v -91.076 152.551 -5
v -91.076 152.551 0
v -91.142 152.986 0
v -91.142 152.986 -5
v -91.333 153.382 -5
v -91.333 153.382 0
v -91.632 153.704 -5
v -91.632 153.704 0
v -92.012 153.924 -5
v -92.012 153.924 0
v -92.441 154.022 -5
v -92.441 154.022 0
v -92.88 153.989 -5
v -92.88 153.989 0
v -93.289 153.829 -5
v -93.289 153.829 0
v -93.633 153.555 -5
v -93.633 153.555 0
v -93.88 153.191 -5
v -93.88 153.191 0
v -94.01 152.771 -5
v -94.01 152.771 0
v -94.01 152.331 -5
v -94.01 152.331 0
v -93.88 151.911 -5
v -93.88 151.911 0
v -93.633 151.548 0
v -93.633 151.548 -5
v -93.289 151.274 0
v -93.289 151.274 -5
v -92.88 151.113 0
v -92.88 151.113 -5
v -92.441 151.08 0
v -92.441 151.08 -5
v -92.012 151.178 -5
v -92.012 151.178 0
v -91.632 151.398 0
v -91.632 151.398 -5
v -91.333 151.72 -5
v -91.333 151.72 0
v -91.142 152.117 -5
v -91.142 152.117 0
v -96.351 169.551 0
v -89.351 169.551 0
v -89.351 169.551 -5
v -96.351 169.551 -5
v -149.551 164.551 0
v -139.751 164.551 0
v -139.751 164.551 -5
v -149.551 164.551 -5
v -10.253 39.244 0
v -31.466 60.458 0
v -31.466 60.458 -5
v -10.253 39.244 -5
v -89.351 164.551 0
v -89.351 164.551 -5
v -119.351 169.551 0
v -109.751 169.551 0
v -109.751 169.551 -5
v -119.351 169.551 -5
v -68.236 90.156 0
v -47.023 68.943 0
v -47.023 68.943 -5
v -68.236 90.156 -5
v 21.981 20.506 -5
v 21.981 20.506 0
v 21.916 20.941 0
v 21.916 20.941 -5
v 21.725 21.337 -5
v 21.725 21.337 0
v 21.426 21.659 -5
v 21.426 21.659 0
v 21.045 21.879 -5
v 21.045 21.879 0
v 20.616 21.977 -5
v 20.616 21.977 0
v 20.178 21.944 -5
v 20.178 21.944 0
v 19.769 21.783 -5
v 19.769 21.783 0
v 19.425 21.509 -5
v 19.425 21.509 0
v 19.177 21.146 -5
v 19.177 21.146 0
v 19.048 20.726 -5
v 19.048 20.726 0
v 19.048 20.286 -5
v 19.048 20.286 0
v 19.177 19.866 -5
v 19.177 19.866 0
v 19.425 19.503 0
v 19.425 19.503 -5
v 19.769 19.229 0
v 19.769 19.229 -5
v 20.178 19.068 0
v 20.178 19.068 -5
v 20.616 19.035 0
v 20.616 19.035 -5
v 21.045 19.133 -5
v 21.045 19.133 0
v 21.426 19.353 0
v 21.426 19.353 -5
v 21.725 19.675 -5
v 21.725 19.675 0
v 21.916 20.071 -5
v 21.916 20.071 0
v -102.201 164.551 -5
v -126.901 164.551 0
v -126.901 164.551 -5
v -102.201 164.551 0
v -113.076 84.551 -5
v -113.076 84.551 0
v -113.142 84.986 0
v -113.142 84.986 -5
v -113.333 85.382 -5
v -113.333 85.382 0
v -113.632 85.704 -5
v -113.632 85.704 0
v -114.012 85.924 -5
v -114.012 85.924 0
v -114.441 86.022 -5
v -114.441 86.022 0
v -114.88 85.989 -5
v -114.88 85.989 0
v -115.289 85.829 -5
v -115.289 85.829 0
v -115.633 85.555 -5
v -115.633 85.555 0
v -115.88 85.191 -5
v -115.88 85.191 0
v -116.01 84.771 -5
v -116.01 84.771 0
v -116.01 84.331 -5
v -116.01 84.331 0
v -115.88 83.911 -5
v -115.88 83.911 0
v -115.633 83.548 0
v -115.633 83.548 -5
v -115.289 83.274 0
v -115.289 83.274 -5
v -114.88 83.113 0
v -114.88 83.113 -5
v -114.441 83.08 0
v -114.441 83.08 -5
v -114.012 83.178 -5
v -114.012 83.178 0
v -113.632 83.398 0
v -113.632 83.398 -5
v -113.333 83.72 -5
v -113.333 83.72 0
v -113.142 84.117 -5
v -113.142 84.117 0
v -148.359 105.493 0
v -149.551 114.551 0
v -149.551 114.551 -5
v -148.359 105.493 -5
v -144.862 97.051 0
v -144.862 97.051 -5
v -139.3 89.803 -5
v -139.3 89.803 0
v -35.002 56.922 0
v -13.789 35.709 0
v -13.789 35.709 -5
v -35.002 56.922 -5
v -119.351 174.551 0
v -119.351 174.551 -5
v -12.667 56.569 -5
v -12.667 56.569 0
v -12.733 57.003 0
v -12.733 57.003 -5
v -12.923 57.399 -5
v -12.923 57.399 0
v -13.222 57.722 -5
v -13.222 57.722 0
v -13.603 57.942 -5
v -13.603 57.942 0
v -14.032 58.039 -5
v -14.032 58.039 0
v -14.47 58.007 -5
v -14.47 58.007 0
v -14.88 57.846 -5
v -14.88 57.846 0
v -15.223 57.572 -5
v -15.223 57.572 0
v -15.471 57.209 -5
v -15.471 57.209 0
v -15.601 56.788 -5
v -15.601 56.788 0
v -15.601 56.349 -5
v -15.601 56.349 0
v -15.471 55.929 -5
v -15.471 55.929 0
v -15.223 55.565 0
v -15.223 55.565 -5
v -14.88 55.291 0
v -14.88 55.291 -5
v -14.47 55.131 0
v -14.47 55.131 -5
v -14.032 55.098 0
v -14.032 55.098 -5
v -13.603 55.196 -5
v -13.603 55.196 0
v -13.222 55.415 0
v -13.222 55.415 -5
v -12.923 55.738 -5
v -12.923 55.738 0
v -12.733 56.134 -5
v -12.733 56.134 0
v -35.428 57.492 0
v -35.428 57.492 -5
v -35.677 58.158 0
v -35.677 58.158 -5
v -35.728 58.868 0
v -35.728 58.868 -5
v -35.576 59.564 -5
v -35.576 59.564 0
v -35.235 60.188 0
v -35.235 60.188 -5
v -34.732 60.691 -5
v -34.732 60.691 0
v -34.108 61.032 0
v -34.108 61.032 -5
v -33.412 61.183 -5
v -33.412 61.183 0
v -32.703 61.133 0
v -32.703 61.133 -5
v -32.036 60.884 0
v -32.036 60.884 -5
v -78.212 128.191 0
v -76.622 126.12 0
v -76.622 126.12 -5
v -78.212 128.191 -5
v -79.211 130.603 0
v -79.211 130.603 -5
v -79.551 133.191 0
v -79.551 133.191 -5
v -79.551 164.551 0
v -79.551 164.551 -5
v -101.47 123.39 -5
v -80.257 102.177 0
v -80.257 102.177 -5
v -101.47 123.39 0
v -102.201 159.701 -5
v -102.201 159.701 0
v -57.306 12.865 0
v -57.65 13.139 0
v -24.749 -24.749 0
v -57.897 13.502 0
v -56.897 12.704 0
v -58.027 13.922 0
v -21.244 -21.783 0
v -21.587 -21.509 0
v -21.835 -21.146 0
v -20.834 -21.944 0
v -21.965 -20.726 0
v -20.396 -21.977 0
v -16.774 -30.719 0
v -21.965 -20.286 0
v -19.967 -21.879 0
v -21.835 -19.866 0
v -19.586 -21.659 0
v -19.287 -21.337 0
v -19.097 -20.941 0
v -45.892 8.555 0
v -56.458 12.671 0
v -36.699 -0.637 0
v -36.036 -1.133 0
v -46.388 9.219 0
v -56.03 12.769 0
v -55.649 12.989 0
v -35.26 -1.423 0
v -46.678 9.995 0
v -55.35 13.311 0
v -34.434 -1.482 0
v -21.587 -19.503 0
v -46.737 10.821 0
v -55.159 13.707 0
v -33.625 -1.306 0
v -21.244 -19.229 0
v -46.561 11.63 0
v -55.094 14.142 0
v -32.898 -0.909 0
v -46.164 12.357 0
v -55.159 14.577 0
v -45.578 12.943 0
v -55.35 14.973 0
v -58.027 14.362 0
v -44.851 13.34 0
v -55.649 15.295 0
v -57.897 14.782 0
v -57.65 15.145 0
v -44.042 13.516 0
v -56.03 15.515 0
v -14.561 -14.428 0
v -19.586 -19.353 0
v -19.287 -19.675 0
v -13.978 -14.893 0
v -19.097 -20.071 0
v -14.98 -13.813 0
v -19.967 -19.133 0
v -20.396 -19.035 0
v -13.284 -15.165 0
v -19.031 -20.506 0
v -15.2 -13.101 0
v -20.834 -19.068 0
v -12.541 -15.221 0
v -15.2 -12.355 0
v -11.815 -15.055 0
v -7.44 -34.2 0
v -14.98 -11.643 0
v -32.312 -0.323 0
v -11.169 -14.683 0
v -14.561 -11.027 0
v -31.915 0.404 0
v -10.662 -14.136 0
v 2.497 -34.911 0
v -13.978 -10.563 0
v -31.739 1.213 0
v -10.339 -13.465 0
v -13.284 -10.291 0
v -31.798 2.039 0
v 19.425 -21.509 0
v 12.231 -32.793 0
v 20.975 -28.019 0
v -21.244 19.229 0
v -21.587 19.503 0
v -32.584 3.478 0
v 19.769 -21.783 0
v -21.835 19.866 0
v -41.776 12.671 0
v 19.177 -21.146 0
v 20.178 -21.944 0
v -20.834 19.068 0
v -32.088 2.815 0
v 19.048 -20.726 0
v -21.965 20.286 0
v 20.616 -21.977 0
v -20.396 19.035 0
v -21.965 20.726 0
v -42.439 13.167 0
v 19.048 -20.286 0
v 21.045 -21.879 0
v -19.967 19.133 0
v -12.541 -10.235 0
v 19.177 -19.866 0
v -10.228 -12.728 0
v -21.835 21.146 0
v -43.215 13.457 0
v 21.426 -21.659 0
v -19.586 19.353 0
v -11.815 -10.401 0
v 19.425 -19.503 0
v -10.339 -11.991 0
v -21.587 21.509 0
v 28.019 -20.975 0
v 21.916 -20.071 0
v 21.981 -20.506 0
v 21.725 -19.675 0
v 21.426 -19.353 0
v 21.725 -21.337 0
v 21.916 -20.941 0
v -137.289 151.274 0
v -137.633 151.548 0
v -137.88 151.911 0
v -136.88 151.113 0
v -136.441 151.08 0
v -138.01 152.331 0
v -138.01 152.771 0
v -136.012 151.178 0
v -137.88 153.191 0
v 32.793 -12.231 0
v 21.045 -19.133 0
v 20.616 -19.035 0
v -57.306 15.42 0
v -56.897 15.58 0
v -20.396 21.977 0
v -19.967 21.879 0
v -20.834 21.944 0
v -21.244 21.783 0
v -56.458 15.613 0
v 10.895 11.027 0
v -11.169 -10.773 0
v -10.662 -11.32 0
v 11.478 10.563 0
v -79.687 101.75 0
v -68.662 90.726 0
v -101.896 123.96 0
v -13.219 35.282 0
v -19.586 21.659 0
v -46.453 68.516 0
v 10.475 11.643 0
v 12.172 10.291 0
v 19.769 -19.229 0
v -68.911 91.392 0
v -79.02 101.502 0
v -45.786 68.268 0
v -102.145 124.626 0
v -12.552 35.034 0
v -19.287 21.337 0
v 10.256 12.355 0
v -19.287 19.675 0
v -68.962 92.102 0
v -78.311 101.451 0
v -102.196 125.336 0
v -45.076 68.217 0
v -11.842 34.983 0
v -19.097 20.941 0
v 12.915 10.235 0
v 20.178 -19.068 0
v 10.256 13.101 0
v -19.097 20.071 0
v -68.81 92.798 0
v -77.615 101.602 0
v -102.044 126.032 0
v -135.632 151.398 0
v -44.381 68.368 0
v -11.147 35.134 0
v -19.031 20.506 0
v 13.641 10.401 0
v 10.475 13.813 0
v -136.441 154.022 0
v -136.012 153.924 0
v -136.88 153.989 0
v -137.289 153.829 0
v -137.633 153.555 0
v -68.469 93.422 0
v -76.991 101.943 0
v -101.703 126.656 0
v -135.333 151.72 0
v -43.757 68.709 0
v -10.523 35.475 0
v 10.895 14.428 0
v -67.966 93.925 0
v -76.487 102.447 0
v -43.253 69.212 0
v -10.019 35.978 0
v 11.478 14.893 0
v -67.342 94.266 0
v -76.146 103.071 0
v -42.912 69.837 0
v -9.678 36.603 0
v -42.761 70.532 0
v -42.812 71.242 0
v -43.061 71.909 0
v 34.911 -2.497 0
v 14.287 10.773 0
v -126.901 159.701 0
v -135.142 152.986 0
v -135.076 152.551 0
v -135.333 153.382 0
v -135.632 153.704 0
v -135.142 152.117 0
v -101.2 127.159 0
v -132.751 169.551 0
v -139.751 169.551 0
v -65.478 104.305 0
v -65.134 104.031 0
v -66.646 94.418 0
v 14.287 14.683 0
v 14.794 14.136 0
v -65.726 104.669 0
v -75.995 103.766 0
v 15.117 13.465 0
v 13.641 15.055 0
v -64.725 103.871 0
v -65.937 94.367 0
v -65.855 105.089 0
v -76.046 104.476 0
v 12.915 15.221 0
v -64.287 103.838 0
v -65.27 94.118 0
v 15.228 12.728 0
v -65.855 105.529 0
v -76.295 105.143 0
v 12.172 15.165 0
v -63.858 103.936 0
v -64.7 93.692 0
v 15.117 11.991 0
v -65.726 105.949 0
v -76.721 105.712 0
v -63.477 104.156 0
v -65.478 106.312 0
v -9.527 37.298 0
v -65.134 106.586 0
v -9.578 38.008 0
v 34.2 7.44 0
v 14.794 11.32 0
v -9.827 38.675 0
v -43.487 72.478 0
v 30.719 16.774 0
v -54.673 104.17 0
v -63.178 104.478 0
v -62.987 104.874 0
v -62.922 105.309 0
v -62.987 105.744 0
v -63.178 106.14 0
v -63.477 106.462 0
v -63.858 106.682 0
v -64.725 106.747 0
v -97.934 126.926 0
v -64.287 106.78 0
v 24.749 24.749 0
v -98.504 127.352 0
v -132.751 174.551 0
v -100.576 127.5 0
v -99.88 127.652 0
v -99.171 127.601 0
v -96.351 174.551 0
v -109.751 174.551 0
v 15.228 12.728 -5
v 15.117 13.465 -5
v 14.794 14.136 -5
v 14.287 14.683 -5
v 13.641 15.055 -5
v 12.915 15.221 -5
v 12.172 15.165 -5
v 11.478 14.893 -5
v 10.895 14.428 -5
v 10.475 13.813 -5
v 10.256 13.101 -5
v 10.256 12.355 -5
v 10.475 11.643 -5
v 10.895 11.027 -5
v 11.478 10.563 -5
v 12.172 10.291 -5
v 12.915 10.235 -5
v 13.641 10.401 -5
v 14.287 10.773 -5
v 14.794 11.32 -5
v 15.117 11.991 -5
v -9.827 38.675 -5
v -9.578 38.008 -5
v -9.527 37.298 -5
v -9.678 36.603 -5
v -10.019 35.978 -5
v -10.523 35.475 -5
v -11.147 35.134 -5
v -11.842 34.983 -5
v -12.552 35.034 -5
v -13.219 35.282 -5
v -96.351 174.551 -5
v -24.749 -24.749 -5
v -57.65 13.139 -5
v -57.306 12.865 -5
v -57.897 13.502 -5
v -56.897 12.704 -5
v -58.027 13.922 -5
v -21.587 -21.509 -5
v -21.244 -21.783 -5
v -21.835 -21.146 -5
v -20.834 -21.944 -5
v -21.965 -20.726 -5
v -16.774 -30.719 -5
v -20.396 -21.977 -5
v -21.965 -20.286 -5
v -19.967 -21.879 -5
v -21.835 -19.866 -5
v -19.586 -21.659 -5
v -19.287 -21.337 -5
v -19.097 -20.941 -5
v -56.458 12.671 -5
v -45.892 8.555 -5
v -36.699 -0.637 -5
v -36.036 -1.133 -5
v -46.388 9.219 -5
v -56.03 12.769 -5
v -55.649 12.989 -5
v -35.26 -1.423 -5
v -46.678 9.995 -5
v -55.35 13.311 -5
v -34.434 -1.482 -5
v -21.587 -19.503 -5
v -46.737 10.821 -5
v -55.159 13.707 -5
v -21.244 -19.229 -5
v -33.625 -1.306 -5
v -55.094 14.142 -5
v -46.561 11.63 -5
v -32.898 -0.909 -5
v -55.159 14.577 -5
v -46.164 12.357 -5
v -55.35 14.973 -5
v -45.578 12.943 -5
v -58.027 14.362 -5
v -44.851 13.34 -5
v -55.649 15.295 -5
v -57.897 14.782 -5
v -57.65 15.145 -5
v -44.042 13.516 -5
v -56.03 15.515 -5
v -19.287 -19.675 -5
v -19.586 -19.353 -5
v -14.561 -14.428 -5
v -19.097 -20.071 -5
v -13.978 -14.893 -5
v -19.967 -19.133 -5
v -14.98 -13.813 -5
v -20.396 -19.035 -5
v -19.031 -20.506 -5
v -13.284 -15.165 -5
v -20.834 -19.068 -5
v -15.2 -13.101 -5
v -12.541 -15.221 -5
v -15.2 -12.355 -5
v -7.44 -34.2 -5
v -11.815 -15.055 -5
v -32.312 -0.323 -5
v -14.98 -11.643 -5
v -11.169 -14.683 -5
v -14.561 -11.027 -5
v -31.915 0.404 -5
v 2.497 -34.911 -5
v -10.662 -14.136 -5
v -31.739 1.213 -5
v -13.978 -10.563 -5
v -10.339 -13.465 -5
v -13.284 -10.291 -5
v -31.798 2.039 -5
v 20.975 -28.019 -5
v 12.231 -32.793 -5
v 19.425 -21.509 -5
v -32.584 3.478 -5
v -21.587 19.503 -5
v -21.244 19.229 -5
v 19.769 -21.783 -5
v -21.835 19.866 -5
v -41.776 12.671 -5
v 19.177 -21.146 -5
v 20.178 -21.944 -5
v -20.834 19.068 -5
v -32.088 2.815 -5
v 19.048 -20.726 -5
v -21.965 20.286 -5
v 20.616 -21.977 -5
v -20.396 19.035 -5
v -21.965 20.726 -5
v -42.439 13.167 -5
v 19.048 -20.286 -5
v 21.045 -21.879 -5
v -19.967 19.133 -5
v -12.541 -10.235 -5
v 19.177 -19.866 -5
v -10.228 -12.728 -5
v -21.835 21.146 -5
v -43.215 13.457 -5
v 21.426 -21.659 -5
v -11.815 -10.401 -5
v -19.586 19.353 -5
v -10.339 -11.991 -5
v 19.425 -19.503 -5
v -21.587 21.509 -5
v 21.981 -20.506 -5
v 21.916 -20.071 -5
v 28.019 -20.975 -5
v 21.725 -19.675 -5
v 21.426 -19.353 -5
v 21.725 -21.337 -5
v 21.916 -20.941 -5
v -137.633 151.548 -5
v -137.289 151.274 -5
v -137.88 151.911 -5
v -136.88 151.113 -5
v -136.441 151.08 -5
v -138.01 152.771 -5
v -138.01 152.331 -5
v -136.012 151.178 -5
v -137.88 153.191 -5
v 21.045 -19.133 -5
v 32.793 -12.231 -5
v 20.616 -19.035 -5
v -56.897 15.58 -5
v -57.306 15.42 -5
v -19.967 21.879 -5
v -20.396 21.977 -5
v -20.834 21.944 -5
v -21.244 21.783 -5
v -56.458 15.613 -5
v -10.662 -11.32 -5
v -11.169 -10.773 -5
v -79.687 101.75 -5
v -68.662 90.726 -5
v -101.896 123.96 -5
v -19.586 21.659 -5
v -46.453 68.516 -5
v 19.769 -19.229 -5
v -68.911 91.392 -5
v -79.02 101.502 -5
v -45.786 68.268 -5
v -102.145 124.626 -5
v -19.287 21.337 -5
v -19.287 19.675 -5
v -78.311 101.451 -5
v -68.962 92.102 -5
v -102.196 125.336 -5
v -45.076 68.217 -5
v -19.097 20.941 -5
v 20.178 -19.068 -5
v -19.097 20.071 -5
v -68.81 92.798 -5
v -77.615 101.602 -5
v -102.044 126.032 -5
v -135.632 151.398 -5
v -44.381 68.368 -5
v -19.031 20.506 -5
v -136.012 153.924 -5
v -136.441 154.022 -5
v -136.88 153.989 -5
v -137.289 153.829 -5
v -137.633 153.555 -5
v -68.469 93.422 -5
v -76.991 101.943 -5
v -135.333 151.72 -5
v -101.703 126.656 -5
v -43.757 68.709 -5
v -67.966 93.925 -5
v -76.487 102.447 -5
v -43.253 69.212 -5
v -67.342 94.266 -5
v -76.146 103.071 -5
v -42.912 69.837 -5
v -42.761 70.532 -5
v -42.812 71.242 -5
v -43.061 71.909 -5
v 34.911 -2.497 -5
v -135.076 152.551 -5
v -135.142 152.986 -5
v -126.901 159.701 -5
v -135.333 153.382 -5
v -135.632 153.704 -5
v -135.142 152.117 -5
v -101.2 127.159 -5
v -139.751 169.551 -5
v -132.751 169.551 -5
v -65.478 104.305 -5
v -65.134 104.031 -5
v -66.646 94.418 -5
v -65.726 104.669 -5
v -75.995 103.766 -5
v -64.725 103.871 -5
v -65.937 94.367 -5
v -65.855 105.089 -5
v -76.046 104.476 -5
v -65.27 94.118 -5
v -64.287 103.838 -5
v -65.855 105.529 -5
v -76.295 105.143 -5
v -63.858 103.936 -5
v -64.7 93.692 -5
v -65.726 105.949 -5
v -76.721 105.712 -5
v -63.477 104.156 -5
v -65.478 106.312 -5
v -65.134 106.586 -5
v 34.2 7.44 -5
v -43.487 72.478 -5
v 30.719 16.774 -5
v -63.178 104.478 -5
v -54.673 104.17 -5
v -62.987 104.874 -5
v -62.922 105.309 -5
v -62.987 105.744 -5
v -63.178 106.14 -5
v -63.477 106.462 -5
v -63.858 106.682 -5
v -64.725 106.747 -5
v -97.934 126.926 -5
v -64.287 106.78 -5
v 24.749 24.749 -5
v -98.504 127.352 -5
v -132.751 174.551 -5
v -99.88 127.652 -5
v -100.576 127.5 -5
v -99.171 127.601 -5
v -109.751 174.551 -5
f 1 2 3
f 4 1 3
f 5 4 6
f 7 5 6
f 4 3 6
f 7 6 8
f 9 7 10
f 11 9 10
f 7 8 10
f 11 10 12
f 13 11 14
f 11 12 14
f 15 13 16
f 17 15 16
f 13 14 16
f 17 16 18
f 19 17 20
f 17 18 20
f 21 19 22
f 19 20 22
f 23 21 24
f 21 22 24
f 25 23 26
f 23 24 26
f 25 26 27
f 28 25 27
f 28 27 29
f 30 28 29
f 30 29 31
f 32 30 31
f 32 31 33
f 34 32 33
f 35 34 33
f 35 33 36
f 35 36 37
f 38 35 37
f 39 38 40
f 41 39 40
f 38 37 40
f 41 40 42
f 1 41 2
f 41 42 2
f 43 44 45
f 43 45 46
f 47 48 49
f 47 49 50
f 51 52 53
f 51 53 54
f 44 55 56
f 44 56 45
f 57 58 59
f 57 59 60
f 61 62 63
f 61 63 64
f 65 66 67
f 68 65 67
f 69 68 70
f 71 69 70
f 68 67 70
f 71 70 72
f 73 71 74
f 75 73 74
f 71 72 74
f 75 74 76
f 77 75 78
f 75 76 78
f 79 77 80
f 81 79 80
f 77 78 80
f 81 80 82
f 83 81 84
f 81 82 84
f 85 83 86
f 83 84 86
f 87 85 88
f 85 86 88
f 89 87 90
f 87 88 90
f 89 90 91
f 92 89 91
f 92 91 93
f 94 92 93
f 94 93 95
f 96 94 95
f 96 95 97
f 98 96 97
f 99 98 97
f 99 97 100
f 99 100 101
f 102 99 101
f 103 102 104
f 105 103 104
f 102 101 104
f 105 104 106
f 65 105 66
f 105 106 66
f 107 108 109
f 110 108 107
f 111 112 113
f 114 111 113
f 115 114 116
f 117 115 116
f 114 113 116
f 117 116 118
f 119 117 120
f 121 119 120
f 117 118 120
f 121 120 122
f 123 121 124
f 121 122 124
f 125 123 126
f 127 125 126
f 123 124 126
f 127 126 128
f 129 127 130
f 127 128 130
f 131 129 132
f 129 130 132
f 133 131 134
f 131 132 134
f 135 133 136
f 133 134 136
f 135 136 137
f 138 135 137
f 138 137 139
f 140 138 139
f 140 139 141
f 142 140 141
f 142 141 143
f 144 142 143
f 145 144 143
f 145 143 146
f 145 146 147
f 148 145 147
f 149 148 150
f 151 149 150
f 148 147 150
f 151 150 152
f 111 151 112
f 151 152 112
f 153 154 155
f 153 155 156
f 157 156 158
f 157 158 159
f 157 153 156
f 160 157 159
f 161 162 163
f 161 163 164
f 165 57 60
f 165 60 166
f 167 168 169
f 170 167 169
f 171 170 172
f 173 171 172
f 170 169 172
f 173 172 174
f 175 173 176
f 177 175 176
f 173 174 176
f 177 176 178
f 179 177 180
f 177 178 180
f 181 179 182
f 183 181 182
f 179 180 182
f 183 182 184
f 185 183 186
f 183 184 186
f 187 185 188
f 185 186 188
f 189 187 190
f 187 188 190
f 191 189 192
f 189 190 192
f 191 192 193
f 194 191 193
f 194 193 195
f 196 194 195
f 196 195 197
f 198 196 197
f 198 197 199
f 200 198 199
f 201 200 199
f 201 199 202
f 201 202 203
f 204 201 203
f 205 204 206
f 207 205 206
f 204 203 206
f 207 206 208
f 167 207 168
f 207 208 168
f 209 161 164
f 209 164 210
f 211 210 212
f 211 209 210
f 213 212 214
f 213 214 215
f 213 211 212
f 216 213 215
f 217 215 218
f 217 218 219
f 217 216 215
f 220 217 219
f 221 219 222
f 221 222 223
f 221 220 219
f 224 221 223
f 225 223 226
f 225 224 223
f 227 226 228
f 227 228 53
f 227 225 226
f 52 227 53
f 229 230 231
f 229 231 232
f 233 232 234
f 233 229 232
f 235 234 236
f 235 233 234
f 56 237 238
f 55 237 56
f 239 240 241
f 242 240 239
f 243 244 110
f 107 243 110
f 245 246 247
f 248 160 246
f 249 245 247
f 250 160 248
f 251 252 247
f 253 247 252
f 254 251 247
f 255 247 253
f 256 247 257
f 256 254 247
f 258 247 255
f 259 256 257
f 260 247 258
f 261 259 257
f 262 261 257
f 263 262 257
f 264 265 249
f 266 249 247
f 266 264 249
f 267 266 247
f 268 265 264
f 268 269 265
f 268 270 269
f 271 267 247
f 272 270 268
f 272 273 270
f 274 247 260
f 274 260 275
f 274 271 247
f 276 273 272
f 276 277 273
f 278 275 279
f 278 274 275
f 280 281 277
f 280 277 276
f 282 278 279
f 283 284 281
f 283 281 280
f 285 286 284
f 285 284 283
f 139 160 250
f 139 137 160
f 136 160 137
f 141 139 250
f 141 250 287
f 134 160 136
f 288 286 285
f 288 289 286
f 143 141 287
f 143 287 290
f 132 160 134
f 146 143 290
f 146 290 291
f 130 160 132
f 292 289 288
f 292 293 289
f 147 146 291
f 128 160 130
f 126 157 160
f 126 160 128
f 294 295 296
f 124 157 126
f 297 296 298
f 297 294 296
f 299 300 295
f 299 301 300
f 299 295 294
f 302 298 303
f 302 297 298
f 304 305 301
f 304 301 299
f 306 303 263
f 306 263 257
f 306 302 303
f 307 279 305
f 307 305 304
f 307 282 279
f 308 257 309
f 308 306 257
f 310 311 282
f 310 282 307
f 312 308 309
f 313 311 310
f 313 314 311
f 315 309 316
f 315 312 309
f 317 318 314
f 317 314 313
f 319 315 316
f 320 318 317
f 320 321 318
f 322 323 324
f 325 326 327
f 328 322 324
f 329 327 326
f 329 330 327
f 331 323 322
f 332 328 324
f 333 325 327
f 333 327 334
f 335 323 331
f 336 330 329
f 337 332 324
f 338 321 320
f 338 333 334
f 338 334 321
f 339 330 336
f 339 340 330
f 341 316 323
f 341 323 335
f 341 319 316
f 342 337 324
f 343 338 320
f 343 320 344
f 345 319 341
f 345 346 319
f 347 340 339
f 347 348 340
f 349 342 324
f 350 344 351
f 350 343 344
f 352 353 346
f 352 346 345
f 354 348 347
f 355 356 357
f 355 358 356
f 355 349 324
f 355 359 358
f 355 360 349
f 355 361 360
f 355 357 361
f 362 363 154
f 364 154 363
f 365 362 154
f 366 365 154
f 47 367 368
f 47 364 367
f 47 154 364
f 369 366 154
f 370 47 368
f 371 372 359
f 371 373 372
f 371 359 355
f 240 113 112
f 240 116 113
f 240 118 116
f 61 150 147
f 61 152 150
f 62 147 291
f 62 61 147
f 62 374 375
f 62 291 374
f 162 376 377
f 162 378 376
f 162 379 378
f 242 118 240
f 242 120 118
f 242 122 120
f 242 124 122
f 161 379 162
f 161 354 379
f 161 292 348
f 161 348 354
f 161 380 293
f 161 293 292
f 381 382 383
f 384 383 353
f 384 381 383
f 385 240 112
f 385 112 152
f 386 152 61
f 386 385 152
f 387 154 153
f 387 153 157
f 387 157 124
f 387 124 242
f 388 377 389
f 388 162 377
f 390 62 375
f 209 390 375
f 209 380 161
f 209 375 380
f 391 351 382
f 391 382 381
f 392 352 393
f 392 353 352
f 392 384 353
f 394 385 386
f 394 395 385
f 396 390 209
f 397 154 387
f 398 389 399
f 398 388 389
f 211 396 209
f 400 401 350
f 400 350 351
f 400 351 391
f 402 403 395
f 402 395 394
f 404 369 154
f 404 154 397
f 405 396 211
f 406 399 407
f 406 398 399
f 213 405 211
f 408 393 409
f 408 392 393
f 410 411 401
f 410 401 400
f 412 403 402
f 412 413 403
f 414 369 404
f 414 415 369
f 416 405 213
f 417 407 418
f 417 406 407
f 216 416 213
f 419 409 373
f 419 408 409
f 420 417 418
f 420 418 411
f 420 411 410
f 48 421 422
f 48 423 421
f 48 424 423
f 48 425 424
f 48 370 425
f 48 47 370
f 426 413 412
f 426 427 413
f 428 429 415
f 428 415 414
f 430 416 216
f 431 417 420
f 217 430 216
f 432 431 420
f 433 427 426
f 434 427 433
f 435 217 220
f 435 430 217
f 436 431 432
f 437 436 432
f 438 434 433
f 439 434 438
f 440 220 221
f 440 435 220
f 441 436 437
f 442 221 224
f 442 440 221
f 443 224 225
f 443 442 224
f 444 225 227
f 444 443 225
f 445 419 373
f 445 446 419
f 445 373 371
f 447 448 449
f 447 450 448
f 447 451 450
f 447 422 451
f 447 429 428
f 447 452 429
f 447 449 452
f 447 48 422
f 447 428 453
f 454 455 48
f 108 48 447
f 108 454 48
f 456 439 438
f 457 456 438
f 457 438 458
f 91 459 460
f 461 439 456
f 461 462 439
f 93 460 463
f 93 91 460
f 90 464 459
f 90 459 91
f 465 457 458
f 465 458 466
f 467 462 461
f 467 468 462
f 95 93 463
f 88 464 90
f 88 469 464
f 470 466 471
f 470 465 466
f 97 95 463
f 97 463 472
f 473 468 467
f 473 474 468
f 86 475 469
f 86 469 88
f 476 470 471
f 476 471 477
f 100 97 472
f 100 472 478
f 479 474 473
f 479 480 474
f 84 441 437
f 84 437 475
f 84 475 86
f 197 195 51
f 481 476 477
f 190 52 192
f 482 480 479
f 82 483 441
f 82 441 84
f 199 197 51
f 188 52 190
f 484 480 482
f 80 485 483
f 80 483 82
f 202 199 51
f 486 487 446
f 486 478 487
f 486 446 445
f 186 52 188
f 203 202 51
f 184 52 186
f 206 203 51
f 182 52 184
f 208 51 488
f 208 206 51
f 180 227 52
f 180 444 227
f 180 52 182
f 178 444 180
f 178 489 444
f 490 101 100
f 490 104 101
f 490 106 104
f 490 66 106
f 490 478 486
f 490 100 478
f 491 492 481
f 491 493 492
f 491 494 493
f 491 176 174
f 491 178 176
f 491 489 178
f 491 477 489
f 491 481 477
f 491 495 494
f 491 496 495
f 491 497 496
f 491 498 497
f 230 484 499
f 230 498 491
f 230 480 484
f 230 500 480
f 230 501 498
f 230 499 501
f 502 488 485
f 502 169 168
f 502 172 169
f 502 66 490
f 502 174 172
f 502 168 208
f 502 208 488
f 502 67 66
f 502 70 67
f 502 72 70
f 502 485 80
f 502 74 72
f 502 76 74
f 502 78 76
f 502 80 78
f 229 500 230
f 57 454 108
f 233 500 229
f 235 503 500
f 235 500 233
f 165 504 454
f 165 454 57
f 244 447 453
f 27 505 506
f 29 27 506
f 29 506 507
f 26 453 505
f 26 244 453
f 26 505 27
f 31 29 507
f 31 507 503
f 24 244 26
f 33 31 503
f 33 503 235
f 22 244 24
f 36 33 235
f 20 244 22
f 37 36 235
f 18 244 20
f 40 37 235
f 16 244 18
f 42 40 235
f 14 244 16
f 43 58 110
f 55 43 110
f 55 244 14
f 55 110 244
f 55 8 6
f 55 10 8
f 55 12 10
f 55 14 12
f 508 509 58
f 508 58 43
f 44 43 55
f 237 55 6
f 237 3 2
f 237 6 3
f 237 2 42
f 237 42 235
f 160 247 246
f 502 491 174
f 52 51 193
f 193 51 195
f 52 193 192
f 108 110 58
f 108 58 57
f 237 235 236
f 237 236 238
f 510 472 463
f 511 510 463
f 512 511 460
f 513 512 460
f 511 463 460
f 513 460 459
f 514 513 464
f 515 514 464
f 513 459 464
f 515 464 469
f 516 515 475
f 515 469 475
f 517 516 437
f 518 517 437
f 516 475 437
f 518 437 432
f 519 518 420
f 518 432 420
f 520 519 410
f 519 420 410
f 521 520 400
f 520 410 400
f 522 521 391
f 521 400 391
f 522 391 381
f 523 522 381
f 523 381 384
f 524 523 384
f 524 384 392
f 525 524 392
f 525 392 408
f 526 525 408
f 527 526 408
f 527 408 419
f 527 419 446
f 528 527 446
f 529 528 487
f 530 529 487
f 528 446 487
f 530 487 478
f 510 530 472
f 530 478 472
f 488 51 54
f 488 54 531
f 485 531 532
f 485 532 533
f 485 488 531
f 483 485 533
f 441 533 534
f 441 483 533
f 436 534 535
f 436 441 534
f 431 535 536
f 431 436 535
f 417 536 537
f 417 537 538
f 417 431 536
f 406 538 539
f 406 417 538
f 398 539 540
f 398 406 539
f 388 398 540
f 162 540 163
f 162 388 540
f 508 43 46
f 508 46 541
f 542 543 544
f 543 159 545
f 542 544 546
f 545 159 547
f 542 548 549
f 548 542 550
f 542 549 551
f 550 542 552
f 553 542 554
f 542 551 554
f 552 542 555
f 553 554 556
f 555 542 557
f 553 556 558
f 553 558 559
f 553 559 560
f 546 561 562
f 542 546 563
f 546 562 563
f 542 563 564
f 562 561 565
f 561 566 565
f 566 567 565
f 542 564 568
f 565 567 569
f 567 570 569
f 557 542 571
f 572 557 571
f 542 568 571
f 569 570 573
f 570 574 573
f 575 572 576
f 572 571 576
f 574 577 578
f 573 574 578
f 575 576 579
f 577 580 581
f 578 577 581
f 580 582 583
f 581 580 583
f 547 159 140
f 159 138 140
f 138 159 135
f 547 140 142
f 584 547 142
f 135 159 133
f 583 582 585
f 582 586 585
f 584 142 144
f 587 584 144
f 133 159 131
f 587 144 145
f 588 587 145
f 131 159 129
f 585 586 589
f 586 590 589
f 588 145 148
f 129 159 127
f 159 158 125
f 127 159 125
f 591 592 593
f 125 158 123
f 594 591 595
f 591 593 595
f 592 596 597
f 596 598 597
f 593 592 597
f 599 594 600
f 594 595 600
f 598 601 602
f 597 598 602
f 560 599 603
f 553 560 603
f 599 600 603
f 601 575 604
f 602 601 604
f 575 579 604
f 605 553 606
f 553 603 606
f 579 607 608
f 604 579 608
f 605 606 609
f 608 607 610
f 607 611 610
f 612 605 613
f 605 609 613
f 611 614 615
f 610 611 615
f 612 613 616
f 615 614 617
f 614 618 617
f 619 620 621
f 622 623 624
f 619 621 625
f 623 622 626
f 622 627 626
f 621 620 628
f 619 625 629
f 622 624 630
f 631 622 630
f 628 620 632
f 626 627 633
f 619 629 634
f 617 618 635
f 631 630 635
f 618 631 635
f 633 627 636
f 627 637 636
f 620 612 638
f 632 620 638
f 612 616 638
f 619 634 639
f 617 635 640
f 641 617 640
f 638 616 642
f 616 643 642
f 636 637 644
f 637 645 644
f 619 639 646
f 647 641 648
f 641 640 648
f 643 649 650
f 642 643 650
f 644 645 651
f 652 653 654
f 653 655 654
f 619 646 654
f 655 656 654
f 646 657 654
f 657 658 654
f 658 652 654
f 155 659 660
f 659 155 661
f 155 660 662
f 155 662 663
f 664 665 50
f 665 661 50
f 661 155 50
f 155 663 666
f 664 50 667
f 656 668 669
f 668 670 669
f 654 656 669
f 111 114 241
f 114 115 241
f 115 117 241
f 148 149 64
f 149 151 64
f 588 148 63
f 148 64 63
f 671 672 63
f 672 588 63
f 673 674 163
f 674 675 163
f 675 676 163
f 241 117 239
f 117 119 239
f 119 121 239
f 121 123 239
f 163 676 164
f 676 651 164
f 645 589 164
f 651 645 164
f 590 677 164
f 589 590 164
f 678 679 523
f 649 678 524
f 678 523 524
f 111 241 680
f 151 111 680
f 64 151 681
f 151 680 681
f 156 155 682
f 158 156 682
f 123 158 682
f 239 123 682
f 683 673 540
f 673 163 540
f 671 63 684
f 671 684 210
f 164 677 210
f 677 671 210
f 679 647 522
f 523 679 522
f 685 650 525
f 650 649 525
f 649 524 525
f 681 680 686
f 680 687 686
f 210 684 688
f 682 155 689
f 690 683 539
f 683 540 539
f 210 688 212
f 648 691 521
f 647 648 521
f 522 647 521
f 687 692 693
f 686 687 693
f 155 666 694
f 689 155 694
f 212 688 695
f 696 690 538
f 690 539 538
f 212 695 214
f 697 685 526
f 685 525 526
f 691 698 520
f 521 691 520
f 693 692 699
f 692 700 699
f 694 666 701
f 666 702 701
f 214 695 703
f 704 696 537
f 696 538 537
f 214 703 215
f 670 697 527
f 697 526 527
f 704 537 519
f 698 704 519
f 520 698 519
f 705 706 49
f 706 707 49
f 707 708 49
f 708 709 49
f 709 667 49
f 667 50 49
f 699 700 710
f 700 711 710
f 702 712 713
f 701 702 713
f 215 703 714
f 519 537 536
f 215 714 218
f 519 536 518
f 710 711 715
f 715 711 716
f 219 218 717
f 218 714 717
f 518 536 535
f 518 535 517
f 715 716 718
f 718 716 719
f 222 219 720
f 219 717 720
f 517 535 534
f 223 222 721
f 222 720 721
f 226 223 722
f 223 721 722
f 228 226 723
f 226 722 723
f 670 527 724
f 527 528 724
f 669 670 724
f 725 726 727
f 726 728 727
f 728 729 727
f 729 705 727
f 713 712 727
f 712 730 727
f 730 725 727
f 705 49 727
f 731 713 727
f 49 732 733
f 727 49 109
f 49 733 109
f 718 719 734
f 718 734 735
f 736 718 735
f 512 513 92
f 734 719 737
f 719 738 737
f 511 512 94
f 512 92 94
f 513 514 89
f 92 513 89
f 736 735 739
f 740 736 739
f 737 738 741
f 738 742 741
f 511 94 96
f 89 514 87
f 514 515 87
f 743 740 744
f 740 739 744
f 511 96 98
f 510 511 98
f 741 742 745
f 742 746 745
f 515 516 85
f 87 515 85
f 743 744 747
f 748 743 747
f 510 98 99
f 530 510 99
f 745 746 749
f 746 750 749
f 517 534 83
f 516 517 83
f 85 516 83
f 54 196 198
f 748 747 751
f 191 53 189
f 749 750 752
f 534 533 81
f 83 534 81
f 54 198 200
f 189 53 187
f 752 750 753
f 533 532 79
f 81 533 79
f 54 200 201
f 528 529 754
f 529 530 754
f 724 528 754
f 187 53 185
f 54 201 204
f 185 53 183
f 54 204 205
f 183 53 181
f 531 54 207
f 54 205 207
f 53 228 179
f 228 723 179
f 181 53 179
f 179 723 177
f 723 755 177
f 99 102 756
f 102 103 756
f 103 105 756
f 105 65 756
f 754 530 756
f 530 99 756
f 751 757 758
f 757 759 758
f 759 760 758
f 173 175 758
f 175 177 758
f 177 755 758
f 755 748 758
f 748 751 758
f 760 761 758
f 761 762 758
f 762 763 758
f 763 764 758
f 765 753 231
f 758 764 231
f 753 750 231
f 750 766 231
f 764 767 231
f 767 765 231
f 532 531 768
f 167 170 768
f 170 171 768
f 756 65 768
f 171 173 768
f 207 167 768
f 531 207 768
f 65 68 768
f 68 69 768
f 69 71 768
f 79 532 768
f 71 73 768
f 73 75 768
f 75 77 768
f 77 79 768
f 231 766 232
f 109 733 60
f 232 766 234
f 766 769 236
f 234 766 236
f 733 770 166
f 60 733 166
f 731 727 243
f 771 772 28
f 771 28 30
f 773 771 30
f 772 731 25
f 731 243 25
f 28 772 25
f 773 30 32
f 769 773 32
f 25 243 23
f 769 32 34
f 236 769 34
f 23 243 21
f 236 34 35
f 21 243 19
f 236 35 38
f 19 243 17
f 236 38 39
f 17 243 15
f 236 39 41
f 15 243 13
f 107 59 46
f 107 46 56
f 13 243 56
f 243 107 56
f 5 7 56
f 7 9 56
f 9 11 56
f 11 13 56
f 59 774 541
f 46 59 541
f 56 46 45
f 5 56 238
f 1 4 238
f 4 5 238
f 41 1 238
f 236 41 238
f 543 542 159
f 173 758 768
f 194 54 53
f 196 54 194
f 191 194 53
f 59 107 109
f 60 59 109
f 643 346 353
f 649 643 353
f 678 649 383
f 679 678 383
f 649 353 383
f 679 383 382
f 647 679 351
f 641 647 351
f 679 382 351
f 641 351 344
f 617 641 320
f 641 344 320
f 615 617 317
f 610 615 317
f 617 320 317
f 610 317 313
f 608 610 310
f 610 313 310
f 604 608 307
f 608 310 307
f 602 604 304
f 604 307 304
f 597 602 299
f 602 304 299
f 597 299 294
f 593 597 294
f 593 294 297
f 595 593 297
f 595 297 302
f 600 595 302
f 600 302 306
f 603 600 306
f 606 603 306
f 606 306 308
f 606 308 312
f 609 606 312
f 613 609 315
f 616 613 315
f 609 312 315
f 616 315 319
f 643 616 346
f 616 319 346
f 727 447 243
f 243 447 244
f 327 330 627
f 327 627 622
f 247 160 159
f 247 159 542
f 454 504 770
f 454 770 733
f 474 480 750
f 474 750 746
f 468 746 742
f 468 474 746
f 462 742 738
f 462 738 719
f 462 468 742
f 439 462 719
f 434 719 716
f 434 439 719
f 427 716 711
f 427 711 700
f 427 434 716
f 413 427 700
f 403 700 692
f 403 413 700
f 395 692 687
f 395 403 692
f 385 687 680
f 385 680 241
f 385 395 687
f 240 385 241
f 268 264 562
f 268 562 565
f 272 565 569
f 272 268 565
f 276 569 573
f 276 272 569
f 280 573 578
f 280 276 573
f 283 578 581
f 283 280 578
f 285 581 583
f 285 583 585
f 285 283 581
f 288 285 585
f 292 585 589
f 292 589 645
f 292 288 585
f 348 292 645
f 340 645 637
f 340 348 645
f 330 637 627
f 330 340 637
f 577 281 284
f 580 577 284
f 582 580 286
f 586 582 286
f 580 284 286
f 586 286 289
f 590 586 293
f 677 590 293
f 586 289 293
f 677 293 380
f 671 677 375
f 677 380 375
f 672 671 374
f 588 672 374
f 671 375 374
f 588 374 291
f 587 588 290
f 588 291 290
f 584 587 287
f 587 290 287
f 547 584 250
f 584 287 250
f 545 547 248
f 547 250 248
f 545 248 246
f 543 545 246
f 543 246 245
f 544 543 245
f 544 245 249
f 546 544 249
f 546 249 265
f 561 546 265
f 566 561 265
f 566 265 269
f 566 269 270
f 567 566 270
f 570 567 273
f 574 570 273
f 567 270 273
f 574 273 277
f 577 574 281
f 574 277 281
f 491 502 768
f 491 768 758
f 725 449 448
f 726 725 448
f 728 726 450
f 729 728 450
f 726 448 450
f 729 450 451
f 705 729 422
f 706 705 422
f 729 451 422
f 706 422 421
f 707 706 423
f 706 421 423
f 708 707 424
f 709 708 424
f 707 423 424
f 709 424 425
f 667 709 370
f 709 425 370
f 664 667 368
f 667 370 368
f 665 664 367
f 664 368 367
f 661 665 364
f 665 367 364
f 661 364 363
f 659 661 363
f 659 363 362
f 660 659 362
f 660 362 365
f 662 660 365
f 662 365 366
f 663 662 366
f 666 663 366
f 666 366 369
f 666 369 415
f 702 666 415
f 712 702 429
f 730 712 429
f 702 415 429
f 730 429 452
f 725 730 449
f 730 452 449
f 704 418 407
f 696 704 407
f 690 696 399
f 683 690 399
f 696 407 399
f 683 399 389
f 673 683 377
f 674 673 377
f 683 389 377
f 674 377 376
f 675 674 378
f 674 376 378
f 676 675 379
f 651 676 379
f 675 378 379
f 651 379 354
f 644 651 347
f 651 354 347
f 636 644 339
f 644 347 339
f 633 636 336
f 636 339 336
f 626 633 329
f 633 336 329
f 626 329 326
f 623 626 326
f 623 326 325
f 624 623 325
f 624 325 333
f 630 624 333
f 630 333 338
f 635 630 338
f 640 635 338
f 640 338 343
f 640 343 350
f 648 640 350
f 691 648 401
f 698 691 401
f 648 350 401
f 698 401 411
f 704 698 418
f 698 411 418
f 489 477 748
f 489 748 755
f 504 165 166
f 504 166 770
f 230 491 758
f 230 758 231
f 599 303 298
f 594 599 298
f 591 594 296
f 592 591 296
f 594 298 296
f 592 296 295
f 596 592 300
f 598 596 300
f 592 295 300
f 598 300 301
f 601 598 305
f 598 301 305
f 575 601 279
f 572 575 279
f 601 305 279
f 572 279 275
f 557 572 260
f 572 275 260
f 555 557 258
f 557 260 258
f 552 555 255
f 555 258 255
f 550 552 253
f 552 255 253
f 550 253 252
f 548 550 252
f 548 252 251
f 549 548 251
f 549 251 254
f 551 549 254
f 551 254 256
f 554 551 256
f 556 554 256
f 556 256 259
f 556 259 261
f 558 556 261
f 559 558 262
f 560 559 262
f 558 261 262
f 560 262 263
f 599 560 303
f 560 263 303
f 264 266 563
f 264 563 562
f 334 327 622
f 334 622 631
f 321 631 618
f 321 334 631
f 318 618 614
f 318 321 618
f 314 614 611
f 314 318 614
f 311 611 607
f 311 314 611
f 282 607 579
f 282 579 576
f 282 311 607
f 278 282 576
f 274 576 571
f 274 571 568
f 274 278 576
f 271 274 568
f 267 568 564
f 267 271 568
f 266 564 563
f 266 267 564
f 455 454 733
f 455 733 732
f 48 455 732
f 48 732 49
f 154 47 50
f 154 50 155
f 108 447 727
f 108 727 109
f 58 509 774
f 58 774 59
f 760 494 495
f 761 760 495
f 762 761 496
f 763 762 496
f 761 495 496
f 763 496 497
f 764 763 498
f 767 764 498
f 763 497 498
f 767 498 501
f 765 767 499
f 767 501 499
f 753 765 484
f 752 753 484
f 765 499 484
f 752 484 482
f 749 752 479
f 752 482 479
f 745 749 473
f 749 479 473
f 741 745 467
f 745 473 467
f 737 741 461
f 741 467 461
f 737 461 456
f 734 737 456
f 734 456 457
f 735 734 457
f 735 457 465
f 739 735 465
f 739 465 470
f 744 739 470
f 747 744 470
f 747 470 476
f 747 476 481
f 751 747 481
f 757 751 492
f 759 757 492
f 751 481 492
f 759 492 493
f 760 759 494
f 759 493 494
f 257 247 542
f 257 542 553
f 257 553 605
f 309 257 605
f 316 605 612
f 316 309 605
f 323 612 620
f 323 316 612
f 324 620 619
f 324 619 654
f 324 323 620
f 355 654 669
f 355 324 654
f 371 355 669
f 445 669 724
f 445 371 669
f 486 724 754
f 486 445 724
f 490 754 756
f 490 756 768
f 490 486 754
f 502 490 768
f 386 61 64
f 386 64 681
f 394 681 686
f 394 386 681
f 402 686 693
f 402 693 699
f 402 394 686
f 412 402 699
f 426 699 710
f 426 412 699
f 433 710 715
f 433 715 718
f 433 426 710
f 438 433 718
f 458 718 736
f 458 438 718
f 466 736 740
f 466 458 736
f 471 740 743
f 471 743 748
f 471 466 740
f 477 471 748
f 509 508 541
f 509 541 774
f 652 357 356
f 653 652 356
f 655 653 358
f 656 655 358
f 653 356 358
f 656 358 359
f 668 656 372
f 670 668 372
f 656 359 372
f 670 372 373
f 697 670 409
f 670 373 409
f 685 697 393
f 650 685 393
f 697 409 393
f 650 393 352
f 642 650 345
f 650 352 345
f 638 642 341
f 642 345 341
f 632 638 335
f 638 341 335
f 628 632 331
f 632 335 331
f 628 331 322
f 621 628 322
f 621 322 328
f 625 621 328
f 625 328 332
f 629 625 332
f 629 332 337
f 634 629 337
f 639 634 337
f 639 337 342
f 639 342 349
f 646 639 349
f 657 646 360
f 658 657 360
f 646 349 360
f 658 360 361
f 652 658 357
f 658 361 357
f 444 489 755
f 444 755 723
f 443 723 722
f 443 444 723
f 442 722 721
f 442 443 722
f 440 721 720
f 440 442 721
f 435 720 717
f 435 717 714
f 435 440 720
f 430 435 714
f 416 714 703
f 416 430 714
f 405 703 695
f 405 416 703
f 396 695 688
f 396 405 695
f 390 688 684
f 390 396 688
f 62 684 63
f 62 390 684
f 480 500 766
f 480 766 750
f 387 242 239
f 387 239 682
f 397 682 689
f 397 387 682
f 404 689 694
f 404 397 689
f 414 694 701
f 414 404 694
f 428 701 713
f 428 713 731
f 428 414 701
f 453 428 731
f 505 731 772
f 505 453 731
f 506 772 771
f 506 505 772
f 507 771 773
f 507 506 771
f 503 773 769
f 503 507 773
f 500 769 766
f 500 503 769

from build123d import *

# Parameters (mm, degrees)
SKETCH1_R           = 1.475
SKETCH1_R_2         = 2.5
SKETCH1_W           = 24.7
SKETCH1_H           = 4.85
BOSS_EXTRUDE1_DEPTH = 5


with BuildPart() as part:
    # Sketch1 → Boss-Extrude1 (new body)
    with BuildSketch(Plane.XY):
        with BuildLine():
            Line((-139.300035894, 89.802561211), (-24.748737342, -24.748737342))
            ThreePointArc((-24.748737342, -24.748737342), (24.748737342, -24.748737342), (24.748737342, 24.748737342))
            Line((24.748737342, 24.748737342), (-54.672802234, 104.170276917))
            Line((-54.672802234, 104.170276917), (-76.622366364, 126.119841047))
            ThreePointArc((-76.622366364, 126.119841047), (-78.790093877, 129.364074535), (-79.551298552, 133.190908859))
            Line((-79.551298552, 133.190908859), (-79.551298552, 164.551298552))
            Line((-79.551298552, 164.551298552), (-89.351298552, 164.551298552))
            Line((-89.351298552, 164.551298552), (-89.351298552, 169.551298552))
            Line((-89.351298552, 169.551298552), (-96.351298552, 169.551298552))
            Line((-96.351298552, 169.551298552), (-96.351298552, 174.551298552))
            Line((-96.351298552, 174.551298552), (-109.751298552, 174.551298552))
            Line((-109.751298552, 174.551298552), (-109.751298552, 169.551298552))
            Line((-109.751298552, 169.551298552), (-119.351298552, 169.551298552))
            Line((-119.351298552, 169.551298552), (-119.351298552, 174.551298552))
            Line((-119.351298552, 174.551298552), (-132.751298552, 174.551298552))
            Line((-132.751298552, 174.551298552), (-132.751298552, 169.551298552))
            Line((-132.751298552, 169.551298552), (-139.751298552, 169.551298552))
            Line((-139.751298552, 169.551298552), (-139.751298552, 164.551298552))
            Line((-139.751298552, 164.551298552), (-149.551298552, 164.551298552))
            Line((-149.551298552, 164.551298552), (-149.551298552, 114.551298552))
            ThreePointArc((-149.551298552, 114.551298552), (-146.88708219, 101.157378419), (-139.300035894, 89.802561211))
        make_face()
        with Locations((-20.506096654, -20.506096654)):
            Circle(SKETCH1_R, mode=Mode.SUBTRACT)
        with Locations((-12.727922061, -12.727922061)):
            Circle(SKETCH1_R_2, mode=Mode.SUBTRACT)
        with Locations((-56.568542495, 14.142135624)):
            Circle(SKETCH1_R, mode=Mode.SUBTRACT)
        with BuildLine():
            ThreePointArc((-45.891723759, 8.555498392), (-45.891723759, 12.670859859), (-41.776362292, 12.670859859))
            Line((-41.776362292, 12.670859859), (-32.583974137, 3.478471703))
            ThreePointArc((-32.583974137, 3.478471703), (-32.583974137, -0.636889763), (-36.699335604, -0.636889763))
            Line((-36.699335604, -0.636889763), (-45.891723759, 8.555498392))
        make_face(mode=Mode.SUBTRACT)
        with Locations((20.506096654, -20.506096654)):
            Circle(SKETCH1_R, mode=Mode.SUBTRACT)
        with Locations((12.727922061, 12.727922061)):
            Circle(SKETCH1_R_2, mode=Mode.SUBTRACT)
        with Locations((-20.506096654, 20.506096654)):
            Circle(SKETCH1_R, mode=Mode.SUBTRACT)
        with BuildLine():
            ThreePointArc((-35.001785669, 56.922095886), (-35.001785669, 60.457629791), (-31.466251763, 60.457629791))
            Line((-31.466251763, 60.457629791), (-10.253048327, 39.244426356))
            ThreePointArc((-10.253048327, 39.244426356), (-10.253048327, 35.70889245), (-13.788582233, 35.70889245))
            Line((-13.788582233, 35.70889245), (-35.001785669, 56.922095886))
        make_face(mode=Mode.SUBTRACT)
        with Locations((-14.142135624, 56.568542495)):
            Circle(SKETCH1_R, mode=Mode.SUBTRACT)
        with Locations((20.506096654, 20.506096654)):
            Circle(SKETCH1_R, mode=Mode.SUBTRACT)
        with Locations((-114.551298552, 84.551298552)):
            Circle(SKETCH1_R, mode=Mode.SUBTRACT)
        with BuildLine():
            ThreePointArc((-101.4698231, 123.390133317), (-101.4698231, 126.925667223), (-97.934289194, 126.925667223))
            Line((-97.934289194, 126.925667223), (-76.721085759, 105.712463787))
            ThreePointArc((-76.721085759, 105.712463787), (-76.721085759, 102.176929881), (-80.256619665, 102.176929881))
            Line((-80.256619665, 102.176929881), (-101.4698231, 123.390133317))
        make_face(mode=Mode.SUBTRACT)
        with Locations((-64.396887007, 105.308740477)):
            Circle(SKETCH1_R, mode=Mode.SUBTRACT)
        with Locations((-136.551298552, 152.551298552)):
            Circle(SKETCH1_R, mode=Mode.SUBTRACT)
        with Locations((-114.551298552, 162.126298552)):
            Rectangle(SKETCH1_W, SKETCH1_H, mode=Mode.SUBTRACT)
        with Locations((-92.551298552, 152.551298552)):
            Circle(SKETCH1_R, mode=Mode.SUBTRACT)
        with BuildLine():
            ThreePointArc((-68.235804384, 90.156114601), (-68.235804384, 93.691648507), (-64.700270479, 93.691648507))
            Line((-64.700270479, 93.691648507), (-43.487067043, 72.478445072))
            ThreePointArc((-43.487067043, 72.478445072), (-43.487067043, 68.942911166), (-47.022600949, 68.942911166))
            Line((-47.022600949, 68.942911166), (-68.235804384, 90.156114601))
        make_face(mode=Mode.SUBTRACT)
    extrude(amount=-BOSS_EXTRUDE1_DEPTH)


solid = part.part
